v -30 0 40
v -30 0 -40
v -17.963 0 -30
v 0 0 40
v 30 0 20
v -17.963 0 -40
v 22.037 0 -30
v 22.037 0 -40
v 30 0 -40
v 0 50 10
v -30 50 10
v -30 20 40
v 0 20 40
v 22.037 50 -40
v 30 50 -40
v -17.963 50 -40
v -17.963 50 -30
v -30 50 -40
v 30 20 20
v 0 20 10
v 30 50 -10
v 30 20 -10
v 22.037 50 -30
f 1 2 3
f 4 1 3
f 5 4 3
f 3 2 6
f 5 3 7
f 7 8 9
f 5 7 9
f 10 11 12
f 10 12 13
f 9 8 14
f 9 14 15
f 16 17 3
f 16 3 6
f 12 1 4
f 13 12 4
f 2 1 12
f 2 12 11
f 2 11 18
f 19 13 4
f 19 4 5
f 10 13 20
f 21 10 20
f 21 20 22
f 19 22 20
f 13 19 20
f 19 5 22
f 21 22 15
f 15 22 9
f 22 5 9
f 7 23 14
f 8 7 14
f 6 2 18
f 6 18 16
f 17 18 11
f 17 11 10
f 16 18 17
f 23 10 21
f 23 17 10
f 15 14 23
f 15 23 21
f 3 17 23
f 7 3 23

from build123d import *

# Parameters (mm, degrees)
SKETCH1_W           = 60
SKETCH1_H           = 80
BOSS_EXTRUDE1_DEPTH = 50
SKETCH2_W           = 40
SKETCH2_H           = 10
CUT_EXTRUDE1_DEPTH  = 50
CUT_EXTRUDE2_DEPTH  = 30
CUT_EXTRUDE3_DEPTH  = 30
CHAMFER1_SIZE       = 30


with BuildPart() as part:
    # Sketch1 → Boss-Extrude1 (new body)
    with BuildSketch(Plane(origin=(0, 0, 0), x_dir=(1, 0, 0), z_dir=(0, 1, 0))):
        Rectangle(SKETCH1_W, SKETCH1_H)
    extrude(amount=BOSS_EXTRUDE1_DEPTH)

    # Sketch2 → Cut-Extrude1 (cut)
    with BuildSketch(Plane(origin=(0, 50, 0), x_dir=(1, 0, 0), z_dir=(0, 1, 0))):
        with Locations((2.037233821, 35)):
            Rectangle(SKETCH2_W, SKETCH2_H)
    extrude(amount=-CUT_EXTRUDE1_DEPTH, mode=Mode.SUBTRACT)

    # Sketch3 → Cut-Extrude2 (cut)
    with BuildSketch(Plane(origin=(0, 50, 0), x_dir=(1, 0, 0), z_dir=(0, 1, 0))):
        Polygon((0, -10), (30, 10), (30, -40), (0, -40), align=None)
    extrude(amount=-CUT_EXTRUDE2_DEPTH, mode=Mode.SUBTRACT)

    # Sketch4 → Cut-Extrude3 (cut)
    with BuildSketch(Plane(origin=(0, 20, 0), x_dir=(1, 0, 0), z_dir=(0, 1, 0))):
        Polygon((0, -40), (30, -20), (30, -40), align=None)
    extrude(amount=-CUT_EXTRUDE3_DEPTH, mode=Mode.SUBTRACT)

    # Chamfer1
    chamfer1_edges = [part.edges().sort_by_distance(p)[0] for p in [
        (-15, 50, 40),
    ]]
    chamfer(chamfer1_edges, length=CHAMFER1_SIZE)


solid = part.part
